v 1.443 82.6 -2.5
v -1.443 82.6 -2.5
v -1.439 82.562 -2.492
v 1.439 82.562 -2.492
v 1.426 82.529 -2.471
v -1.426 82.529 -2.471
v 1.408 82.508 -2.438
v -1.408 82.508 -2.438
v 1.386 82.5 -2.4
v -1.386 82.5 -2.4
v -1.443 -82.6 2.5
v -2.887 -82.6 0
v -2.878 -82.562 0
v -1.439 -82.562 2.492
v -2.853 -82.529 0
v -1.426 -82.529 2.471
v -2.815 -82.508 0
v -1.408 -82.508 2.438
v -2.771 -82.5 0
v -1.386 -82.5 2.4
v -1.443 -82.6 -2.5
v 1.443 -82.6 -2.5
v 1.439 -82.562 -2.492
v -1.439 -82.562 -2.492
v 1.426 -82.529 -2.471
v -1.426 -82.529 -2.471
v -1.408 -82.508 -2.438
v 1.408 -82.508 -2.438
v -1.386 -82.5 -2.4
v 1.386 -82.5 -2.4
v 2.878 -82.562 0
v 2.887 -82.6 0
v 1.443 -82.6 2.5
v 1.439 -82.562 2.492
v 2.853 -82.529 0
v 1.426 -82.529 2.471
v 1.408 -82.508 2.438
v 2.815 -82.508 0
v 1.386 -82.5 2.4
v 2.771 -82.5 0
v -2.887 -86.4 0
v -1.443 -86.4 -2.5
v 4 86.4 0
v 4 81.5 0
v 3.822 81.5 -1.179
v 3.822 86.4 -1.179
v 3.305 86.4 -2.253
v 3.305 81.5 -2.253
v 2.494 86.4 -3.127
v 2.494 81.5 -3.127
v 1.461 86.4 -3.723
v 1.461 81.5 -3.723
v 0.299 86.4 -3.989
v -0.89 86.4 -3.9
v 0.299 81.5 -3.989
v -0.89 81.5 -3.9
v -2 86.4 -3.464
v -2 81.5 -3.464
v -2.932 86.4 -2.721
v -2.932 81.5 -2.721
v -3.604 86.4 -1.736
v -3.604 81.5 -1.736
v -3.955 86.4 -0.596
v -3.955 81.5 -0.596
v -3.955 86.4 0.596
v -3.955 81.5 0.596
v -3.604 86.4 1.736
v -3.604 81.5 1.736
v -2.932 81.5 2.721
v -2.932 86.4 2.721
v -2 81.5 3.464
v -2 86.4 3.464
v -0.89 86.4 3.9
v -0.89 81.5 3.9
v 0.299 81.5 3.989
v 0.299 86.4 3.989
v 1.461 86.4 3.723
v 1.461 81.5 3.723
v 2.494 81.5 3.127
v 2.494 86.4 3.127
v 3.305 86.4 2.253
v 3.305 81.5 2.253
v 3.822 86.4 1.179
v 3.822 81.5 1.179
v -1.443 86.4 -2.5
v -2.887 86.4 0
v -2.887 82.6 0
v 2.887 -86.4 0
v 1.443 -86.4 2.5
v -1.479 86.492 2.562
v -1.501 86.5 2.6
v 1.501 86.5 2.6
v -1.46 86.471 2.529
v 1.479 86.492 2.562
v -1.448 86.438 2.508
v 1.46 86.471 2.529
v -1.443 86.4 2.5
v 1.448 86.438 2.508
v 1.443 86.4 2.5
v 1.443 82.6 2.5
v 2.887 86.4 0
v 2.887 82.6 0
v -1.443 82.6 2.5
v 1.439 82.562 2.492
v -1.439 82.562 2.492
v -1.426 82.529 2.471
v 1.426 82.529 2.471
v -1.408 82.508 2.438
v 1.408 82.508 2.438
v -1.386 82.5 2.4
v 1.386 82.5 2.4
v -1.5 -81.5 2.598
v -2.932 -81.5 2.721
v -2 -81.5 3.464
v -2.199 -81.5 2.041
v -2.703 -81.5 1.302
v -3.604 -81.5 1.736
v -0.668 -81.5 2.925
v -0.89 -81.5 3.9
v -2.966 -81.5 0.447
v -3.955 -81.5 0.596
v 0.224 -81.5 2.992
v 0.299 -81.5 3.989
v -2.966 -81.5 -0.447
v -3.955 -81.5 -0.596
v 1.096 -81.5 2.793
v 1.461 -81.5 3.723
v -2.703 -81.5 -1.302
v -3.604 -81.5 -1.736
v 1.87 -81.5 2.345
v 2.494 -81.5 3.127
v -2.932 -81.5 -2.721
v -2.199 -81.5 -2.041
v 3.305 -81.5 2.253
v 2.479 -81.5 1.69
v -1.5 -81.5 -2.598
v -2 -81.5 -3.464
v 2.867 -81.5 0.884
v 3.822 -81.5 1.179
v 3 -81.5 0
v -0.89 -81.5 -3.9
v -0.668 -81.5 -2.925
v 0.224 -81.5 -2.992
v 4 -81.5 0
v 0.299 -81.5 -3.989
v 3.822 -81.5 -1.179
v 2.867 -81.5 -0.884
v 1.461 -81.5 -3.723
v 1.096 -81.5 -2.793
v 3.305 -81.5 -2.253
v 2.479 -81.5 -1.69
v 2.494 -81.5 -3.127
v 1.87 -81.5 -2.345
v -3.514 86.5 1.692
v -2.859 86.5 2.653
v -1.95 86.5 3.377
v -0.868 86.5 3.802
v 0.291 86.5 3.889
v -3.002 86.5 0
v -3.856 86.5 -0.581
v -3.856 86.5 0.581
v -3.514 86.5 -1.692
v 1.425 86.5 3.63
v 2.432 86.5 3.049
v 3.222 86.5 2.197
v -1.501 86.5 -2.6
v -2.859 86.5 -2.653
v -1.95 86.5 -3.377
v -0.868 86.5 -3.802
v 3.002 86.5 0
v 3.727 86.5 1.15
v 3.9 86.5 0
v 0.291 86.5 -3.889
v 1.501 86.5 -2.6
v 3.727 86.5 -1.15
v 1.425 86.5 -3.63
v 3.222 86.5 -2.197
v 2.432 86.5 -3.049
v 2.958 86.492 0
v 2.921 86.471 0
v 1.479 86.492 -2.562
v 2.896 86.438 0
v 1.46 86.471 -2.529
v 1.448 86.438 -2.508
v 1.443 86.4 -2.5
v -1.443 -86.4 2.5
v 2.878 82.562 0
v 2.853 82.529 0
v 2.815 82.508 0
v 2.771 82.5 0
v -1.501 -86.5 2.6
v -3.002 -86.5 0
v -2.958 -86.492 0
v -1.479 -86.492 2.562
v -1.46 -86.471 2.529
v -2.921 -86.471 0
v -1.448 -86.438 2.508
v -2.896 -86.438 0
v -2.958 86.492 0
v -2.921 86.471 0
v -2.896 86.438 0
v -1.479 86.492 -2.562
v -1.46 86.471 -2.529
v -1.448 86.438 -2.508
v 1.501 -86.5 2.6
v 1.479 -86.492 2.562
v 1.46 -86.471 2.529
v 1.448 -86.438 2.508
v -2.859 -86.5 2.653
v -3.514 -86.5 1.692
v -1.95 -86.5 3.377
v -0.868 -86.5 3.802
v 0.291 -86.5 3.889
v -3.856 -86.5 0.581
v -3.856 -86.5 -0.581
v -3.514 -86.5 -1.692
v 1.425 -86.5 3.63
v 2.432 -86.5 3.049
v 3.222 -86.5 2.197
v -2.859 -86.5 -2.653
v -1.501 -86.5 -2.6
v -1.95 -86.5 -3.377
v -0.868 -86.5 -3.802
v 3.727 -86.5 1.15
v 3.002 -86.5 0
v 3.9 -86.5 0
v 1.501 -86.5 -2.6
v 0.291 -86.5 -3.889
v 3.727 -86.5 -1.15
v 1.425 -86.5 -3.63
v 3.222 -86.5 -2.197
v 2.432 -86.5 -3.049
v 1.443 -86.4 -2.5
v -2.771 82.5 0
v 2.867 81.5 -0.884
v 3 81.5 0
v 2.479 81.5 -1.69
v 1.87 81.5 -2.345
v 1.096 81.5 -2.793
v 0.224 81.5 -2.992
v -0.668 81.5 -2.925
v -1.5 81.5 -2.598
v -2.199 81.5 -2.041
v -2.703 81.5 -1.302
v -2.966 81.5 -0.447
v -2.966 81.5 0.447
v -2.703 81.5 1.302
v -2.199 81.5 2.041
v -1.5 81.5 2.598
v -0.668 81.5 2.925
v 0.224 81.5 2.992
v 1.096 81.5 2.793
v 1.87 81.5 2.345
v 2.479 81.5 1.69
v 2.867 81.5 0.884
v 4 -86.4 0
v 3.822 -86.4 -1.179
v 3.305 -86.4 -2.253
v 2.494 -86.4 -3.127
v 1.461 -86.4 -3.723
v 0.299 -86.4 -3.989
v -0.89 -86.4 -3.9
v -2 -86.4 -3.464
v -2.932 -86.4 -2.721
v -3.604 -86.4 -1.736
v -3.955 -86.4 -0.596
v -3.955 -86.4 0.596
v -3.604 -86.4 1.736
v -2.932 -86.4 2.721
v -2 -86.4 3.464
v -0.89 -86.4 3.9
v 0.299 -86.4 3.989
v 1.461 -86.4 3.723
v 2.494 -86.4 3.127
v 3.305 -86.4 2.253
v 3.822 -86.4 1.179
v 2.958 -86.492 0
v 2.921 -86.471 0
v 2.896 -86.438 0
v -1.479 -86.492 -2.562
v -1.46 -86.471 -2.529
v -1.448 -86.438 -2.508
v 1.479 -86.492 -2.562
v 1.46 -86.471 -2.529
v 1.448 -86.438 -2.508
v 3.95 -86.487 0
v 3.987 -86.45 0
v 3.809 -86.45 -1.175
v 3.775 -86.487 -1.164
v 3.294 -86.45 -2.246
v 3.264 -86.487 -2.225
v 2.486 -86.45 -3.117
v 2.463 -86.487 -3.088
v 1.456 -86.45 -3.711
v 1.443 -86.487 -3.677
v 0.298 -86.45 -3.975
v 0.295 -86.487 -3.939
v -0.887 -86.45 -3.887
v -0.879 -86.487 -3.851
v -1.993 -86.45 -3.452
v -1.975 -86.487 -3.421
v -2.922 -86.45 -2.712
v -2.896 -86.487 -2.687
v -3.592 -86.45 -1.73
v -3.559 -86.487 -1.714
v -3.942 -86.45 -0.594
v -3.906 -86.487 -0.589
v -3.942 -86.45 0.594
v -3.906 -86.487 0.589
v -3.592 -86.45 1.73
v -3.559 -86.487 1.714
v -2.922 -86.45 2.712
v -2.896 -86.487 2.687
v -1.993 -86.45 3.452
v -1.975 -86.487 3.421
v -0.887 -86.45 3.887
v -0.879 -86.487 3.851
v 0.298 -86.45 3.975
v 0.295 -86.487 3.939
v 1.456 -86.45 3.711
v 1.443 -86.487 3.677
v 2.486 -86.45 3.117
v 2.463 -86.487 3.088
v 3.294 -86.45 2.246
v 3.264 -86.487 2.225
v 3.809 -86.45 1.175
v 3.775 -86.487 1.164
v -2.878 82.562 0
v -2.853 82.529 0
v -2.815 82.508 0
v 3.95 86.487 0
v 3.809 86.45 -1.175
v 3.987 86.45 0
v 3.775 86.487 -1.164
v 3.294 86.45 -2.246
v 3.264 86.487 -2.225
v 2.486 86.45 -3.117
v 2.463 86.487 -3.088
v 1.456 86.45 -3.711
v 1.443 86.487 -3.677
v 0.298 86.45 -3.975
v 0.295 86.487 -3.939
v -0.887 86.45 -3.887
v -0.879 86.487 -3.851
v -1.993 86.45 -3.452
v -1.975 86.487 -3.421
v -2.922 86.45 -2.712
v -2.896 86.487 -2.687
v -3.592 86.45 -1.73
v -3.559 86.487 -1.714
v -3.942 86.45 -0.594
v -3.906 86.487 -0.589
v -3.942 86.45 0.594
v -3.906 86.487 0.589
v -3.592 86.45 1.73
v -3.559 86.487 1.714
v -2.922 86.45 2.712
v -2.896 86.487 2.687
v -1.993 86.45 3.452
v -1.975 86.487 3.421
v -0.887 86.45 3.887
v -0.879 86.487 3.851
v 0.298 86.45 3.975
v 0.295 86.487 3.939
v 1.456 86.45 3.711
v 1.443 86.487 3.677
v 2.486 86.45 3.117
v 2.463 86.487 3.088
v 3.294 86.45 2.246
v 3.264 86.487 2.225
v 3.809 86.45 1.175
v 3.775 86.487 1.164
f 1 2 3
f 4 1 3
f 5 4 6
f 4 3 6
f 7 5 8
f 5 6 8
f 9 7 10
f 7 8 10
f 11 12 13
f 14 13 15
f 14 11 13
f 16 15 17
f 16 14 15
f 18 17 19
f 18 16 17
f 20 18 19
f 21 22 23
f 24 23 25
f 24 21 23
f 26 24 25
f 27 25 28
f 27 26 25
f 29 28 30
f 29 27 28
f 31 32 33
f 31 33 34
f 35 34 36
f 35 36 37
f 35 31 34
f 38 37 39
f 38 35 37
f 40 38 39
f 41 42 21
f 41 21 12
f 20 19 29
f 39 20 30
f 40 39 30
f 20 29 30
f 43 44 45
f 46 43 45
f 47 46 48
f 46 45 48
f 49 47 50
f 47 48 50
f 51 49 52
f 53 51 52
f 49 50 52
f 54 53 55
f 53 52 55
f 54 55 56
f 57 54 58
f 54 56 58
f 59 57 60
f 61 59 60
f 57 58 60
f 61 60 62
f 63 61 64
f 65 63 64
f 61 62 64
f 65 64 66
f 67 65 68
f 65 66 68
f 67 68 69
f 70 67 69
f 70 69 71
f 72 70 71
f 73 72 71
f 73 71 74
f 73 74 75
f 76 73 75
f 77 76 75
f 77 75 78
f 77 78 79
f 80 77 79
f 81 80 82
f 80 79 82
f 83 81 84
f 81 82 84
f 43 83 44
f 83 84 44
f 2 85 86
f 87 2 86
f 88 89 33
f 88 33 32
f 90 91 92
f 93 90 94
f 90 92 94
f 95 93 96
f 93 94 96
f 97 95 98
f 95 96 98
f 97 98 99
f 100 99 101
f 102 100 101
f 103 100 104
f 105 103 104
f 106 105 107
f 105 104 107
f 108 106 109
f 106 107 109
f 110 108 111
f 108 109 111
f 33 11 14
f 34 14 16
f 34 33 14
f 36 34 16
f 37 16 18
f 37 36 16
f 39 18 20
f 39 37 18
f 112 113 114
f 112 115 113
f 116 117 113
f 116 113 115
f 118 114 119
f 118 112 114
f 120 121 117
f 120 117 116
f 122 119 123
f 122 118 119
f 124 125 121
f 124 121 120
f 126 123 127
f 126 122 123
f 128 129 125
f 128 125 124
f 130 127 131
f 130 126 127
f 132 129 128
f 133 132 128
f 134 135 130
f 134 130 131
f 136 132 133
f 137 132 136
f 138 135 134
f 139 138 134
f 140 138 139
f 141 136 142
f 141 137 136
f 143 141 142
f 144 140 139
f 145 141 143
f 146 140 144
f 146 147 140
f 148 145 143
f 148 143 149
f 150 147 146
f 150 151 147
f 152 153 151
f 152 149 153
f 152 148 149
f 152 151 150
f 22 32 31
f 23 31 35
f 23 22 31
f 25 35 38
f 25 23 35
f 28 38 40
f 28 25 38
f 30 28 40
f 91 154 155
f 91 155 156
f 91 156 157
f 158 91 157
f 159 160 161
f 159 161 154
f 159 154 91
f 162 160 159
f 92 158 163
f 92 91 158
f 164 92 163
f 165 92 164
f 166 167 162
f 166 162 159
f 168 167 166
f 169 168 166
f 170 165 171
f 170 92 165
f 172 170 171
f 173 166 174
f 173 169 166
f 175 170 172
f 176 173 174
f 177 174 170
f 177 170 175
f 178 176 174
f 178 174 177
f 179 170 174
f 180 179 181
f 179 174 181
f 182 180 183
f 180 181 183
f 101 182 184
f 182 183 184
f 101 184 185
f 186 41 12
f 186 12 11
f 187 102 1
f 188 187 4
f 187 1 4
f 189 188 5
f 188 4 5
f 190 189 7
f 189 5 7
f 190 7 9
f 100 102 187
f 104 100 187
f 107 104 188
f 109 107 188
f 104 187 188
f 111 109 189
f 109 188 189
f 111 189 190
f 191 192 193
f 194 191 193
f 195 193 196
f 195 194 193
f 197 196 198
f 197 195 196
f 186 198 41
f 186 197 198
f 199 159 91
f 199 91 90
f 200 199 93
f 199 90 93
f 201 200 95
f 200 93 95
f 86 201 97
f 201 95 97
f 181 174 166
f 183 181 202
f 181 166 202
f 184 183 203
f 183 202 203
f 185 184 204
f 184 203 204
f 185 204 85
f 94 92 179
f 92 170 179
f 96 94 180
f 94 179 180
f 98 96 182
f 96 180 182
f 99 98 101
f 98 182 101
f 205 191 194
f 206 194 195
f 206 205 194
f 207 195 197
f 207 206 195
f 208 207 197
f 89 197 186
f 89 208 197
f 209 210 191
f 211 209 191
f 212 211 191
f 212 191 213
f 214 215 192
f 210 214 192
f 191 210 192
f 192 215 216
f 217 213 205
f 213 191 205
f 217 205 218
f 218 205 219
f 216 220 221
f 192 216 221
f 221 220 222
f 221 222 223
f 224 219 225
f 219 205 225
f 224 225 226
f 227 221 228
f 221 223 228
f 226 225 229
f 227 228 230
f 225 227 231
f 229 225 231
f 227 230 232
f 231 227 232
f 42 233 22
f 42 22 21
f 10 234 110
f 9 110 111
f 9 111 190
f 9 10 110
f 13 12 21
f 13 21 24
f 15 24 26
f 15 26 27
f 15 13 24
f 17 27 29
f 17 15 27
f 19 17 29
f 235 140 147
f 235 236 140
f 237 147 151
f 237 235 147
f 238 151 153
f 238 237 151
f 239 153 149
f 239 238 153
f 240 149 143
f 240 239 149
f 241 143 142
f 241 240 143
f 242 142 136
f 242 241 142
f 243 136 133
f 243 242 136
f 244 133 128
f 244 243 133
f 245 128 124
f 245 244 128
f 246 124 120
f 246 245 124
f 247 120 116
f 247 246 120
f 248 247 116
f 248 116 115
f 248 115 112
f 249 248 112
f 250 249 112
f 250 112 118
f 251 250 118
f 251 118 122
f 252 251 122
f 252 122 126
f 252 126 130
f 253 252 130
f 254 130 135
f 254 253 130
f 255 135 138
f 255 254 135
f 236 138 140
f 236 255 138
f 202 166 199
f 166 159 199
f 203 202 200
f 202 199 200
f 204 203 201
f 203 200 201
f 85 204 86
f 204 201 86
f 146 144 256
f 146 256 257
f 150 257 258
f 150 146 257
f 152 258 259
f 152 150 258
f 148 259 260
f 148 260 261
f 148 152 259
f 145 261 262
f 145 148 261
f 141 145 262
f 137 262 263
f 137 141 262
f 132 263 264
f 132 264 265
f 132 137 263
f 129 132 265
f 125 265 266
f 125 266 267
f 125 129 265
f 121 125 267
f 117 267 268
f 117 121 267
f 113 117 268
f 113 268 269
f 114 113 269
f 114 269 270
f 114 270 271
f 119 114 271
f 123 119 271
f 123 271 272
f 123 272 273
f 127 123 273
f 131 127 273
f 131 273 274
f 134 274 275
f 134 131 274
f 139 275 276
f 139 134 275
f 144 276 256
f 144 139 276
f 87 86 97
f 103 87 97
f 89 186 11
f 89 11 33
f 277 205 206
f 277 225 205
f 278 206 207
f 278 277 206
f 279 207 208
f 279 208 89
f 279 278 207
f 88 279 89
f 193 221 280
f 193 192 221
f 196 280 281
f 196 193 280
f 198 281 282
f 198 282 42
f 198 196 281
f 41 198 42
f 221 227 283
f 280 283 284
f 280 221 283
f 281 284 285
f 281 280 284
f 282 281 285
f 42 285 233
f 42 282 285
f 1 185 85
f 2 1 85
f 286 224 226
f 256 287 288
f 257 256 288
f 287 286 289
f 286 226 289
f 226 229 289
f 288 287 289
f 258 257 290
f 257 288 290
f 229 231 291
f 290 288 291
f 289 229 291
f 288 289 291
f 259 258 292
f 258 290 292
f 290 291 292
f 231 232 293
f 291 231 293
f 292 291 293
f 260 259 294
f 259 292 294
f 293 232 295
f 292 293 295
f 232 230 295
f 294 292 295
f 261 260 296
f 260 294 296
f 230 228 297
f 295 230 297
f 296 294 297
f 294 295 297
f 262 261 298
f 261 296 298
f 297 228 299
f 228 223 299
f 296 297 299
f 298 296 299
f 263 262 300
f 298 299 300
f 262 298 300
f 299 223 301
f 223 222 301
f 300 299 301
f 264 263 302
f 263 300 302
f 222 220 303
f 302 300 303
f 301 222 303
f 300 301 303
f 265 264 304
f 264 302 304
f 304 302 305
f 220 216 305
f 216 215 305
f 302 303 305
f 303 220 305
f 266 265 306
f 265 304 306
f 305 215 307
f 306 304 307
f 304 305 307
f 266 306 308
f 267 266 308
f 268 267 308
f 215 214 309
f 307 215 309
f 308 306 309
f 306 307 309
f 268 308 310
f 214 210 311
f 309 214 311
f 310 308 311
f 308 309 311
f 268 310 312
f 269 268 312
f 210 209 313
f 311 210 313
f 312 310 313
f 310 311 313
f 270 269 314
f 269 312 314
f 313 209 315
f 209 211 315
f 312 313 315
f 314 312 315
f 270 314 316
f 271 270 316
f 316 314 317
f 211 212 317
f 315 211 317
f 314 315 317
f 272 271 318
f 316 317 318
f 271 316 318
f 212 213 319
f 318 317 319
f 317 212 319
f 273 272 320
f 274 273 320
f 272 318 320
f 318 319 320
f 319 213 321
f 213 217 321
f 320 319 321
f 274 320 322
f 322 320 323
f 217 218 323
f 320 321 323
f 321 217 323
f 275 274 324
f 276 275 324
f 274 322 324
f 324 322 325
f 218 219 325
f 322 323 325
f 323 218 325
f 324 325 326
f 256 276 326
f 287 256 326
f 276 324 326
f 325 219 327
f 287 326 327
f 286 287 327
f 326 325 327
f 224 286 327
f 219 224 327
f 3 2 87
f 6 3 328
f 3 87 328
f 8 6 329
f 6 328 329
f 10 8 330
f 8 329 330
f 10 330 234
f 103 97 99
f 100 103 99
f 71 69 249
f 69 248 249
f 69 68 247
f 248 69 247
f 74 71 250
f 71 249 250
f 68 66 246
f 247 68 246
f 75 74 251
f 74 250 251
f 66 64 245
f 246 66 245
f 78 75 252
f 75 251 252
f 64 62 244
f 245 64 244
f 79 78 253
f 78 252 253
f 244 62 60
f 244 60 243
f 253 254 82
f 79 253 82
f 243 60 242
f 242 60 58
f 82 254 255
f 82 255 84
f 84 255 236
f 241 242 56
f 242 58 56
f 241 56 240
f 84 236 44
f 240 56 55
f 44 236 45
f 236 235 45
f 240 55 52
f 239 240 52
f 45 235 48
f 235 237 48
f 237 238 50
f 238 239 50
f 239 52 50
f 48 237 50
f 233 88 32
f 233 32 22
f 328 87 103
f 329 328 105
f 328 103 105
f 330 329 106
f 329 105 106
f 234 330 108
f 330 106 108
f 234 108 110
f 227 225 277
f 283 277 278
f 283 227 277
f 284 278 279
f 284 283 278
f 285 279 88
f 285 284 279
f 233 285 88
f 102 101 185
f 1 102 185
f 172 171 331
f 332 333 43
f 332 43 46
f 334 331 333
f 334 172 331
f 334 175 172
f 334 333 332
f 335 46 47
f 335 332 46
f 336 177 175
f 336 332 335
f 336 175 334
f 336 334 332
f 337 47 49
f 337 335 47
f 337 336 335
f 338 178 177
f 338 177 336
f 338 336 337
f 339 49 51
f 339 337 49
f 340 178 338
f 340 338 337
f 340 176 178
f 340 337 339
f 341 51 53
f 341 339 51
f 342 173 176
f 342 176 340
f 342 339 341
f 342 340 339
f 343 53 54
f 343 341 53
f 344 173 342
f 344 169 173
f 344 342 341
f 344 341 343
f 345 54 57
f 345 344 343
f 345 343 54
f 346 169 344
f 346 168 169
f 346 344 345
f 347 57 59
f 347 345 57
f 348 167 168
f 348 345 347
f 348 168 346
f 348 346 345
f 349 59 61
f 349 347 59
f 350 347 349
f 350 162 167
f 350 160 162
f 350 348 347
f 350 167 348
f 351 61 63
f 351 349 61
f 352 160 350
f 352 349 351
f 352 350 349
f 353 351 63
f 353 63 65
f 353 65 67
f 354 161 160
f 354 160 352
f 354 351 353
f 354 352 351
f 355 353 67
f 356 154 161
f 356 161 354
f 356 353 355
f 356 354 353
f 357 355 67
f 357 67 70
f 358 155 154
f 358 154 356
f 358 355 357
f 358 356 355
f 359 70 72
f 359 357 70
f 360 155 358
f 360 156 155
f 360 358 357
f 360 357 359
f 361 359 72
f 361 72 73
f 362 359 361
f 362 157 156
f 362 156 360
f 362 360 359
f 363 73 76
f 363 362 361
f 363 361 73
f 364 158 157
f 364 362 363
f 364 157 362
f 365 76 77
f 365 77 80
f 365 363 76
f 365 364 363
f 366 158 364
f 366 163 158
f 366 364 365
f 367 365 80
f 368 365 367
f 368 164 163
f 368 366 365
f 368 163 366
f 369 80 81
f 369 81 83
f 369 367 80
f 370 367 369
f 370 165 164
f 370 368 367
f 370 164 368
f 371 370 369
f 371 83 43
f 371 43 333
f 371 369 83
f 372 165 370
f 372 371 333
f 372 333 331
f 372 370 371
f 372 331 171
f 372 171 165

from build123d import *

# Parameters (mm, degrees)
SKETCH2_R            = 3
BOSS_EXTRUDE1_DEPTH  = 81.5
SKETCH4_R            = 4
BOSS_EXTRUDE2_DEPTH  = 5
CUT_EXTRUDE1_DEPTH   = 4
FILLET1_R            = 0.1
FILLET1_OF_MIRROR1_R = 0.1


with BuildPart() as part:
    # Sketch2 → Boss-Extrude1 (new body, symmetric)
    with BuildSketch(Plane(origin=(0, 0, 0), x_dir=(1, 0, 0), z_dir=(0, 1, 0))):
        Circle(SKETCH2_R)
    extrude(amount=BOSS_EXTRUDE1_DEPTH, both=True)

    # Sketch4 → Boss-Extrude2 (add)
    with BuildSketch(Plane(origin=(0, 81.5, 0), x_dir=(1, 0, 0), z_dir=(0, 1, 0))):
        Circle(SKETCH4_R)
    boss_extrude2 = extrude(amount=BOSS_EXTRUDE2_DEPTH)

    # Sketch5 → Cut-Extrude1 (cut)
    with BuildSketch(Plane(origin=(0, 86.5, 0), x_dir=(1, 0, 0), z_dir=(0, 1, 0))):
        Polygon((1.443375673, -2.5), (2.886751346, 0), (1.443375673, 2.5), (-1.443375673, 2.5), (-2.886751346, 0), (-1.443375673, -2.5), align=None)
    cut_extrude1 = extrude(amount=-CUT_EXTRUDE1_DEPTH, mode=Mode.SUBTRACT)

    # Fillet1
    fillet1_edges = [part.edges().sort_by_distance(p)[0] for p in [
        (0, 82.5, 2.5),
        (-2.165063509, 82.5, 1.25),
        (-2.165063509, 82.5, -1.25),
        (0, 82.5, -2.5),
        (2.165063509, 82.5, -1.25),
        (2.165063509, 82.5, 1.25),
        (0, 86.5, 2.5),
        (2.165063509, 86.5, 1.25),
        (2.165063509, 86.5, -1.25),
        (0, 86.5, -2.5),
        (-2.165063509, 86.5, -1.25),
        (-2.165063509, 86.5, 1.25),
        (-4, 86.5, 0),
    ]]
    fillet(fillet1_edges, radius=FILLET1_R)

    # Mirror1: Boss-Extrude2, Cut-Extrude1 across plane
    add(boss_extrude2.mirror(Plane.ZX))
    add(cut_extrude1.mirror(Plane.ZX), mode=Mode.SUBTRACT)

    # Fillet1 of Mirror1
    fillet1_of_mirror1_edges = [part.edges().sort_by_distance(p)[0] for p in [
        (0, -82.5, 2.5),
        (-2.165063509, -82.5, 1.25),
        (-2.165063509, -82.5, -1.25),
        (0, -82.5, -2.5),
        (2.165063509, -82.5, -1.25),
        (2.165063509, -82.5, 1.25),
        (0, -86.5, 2.5),
        (2.165063509, -86.5, 1.25),
        (2.165063509, -86.5, -1.25),
        (0, -86.5, -2.5),
        (-2.165063509, -86.5, -1.25),
        (-2.165063509, -86.5, 1.25),
        (-4, -86.5, 0),
    ]]
    fillet(fillet1_of_mirror1_edges, radius=FILLET1_OF_MIRROR1_R)


solid = part.part
